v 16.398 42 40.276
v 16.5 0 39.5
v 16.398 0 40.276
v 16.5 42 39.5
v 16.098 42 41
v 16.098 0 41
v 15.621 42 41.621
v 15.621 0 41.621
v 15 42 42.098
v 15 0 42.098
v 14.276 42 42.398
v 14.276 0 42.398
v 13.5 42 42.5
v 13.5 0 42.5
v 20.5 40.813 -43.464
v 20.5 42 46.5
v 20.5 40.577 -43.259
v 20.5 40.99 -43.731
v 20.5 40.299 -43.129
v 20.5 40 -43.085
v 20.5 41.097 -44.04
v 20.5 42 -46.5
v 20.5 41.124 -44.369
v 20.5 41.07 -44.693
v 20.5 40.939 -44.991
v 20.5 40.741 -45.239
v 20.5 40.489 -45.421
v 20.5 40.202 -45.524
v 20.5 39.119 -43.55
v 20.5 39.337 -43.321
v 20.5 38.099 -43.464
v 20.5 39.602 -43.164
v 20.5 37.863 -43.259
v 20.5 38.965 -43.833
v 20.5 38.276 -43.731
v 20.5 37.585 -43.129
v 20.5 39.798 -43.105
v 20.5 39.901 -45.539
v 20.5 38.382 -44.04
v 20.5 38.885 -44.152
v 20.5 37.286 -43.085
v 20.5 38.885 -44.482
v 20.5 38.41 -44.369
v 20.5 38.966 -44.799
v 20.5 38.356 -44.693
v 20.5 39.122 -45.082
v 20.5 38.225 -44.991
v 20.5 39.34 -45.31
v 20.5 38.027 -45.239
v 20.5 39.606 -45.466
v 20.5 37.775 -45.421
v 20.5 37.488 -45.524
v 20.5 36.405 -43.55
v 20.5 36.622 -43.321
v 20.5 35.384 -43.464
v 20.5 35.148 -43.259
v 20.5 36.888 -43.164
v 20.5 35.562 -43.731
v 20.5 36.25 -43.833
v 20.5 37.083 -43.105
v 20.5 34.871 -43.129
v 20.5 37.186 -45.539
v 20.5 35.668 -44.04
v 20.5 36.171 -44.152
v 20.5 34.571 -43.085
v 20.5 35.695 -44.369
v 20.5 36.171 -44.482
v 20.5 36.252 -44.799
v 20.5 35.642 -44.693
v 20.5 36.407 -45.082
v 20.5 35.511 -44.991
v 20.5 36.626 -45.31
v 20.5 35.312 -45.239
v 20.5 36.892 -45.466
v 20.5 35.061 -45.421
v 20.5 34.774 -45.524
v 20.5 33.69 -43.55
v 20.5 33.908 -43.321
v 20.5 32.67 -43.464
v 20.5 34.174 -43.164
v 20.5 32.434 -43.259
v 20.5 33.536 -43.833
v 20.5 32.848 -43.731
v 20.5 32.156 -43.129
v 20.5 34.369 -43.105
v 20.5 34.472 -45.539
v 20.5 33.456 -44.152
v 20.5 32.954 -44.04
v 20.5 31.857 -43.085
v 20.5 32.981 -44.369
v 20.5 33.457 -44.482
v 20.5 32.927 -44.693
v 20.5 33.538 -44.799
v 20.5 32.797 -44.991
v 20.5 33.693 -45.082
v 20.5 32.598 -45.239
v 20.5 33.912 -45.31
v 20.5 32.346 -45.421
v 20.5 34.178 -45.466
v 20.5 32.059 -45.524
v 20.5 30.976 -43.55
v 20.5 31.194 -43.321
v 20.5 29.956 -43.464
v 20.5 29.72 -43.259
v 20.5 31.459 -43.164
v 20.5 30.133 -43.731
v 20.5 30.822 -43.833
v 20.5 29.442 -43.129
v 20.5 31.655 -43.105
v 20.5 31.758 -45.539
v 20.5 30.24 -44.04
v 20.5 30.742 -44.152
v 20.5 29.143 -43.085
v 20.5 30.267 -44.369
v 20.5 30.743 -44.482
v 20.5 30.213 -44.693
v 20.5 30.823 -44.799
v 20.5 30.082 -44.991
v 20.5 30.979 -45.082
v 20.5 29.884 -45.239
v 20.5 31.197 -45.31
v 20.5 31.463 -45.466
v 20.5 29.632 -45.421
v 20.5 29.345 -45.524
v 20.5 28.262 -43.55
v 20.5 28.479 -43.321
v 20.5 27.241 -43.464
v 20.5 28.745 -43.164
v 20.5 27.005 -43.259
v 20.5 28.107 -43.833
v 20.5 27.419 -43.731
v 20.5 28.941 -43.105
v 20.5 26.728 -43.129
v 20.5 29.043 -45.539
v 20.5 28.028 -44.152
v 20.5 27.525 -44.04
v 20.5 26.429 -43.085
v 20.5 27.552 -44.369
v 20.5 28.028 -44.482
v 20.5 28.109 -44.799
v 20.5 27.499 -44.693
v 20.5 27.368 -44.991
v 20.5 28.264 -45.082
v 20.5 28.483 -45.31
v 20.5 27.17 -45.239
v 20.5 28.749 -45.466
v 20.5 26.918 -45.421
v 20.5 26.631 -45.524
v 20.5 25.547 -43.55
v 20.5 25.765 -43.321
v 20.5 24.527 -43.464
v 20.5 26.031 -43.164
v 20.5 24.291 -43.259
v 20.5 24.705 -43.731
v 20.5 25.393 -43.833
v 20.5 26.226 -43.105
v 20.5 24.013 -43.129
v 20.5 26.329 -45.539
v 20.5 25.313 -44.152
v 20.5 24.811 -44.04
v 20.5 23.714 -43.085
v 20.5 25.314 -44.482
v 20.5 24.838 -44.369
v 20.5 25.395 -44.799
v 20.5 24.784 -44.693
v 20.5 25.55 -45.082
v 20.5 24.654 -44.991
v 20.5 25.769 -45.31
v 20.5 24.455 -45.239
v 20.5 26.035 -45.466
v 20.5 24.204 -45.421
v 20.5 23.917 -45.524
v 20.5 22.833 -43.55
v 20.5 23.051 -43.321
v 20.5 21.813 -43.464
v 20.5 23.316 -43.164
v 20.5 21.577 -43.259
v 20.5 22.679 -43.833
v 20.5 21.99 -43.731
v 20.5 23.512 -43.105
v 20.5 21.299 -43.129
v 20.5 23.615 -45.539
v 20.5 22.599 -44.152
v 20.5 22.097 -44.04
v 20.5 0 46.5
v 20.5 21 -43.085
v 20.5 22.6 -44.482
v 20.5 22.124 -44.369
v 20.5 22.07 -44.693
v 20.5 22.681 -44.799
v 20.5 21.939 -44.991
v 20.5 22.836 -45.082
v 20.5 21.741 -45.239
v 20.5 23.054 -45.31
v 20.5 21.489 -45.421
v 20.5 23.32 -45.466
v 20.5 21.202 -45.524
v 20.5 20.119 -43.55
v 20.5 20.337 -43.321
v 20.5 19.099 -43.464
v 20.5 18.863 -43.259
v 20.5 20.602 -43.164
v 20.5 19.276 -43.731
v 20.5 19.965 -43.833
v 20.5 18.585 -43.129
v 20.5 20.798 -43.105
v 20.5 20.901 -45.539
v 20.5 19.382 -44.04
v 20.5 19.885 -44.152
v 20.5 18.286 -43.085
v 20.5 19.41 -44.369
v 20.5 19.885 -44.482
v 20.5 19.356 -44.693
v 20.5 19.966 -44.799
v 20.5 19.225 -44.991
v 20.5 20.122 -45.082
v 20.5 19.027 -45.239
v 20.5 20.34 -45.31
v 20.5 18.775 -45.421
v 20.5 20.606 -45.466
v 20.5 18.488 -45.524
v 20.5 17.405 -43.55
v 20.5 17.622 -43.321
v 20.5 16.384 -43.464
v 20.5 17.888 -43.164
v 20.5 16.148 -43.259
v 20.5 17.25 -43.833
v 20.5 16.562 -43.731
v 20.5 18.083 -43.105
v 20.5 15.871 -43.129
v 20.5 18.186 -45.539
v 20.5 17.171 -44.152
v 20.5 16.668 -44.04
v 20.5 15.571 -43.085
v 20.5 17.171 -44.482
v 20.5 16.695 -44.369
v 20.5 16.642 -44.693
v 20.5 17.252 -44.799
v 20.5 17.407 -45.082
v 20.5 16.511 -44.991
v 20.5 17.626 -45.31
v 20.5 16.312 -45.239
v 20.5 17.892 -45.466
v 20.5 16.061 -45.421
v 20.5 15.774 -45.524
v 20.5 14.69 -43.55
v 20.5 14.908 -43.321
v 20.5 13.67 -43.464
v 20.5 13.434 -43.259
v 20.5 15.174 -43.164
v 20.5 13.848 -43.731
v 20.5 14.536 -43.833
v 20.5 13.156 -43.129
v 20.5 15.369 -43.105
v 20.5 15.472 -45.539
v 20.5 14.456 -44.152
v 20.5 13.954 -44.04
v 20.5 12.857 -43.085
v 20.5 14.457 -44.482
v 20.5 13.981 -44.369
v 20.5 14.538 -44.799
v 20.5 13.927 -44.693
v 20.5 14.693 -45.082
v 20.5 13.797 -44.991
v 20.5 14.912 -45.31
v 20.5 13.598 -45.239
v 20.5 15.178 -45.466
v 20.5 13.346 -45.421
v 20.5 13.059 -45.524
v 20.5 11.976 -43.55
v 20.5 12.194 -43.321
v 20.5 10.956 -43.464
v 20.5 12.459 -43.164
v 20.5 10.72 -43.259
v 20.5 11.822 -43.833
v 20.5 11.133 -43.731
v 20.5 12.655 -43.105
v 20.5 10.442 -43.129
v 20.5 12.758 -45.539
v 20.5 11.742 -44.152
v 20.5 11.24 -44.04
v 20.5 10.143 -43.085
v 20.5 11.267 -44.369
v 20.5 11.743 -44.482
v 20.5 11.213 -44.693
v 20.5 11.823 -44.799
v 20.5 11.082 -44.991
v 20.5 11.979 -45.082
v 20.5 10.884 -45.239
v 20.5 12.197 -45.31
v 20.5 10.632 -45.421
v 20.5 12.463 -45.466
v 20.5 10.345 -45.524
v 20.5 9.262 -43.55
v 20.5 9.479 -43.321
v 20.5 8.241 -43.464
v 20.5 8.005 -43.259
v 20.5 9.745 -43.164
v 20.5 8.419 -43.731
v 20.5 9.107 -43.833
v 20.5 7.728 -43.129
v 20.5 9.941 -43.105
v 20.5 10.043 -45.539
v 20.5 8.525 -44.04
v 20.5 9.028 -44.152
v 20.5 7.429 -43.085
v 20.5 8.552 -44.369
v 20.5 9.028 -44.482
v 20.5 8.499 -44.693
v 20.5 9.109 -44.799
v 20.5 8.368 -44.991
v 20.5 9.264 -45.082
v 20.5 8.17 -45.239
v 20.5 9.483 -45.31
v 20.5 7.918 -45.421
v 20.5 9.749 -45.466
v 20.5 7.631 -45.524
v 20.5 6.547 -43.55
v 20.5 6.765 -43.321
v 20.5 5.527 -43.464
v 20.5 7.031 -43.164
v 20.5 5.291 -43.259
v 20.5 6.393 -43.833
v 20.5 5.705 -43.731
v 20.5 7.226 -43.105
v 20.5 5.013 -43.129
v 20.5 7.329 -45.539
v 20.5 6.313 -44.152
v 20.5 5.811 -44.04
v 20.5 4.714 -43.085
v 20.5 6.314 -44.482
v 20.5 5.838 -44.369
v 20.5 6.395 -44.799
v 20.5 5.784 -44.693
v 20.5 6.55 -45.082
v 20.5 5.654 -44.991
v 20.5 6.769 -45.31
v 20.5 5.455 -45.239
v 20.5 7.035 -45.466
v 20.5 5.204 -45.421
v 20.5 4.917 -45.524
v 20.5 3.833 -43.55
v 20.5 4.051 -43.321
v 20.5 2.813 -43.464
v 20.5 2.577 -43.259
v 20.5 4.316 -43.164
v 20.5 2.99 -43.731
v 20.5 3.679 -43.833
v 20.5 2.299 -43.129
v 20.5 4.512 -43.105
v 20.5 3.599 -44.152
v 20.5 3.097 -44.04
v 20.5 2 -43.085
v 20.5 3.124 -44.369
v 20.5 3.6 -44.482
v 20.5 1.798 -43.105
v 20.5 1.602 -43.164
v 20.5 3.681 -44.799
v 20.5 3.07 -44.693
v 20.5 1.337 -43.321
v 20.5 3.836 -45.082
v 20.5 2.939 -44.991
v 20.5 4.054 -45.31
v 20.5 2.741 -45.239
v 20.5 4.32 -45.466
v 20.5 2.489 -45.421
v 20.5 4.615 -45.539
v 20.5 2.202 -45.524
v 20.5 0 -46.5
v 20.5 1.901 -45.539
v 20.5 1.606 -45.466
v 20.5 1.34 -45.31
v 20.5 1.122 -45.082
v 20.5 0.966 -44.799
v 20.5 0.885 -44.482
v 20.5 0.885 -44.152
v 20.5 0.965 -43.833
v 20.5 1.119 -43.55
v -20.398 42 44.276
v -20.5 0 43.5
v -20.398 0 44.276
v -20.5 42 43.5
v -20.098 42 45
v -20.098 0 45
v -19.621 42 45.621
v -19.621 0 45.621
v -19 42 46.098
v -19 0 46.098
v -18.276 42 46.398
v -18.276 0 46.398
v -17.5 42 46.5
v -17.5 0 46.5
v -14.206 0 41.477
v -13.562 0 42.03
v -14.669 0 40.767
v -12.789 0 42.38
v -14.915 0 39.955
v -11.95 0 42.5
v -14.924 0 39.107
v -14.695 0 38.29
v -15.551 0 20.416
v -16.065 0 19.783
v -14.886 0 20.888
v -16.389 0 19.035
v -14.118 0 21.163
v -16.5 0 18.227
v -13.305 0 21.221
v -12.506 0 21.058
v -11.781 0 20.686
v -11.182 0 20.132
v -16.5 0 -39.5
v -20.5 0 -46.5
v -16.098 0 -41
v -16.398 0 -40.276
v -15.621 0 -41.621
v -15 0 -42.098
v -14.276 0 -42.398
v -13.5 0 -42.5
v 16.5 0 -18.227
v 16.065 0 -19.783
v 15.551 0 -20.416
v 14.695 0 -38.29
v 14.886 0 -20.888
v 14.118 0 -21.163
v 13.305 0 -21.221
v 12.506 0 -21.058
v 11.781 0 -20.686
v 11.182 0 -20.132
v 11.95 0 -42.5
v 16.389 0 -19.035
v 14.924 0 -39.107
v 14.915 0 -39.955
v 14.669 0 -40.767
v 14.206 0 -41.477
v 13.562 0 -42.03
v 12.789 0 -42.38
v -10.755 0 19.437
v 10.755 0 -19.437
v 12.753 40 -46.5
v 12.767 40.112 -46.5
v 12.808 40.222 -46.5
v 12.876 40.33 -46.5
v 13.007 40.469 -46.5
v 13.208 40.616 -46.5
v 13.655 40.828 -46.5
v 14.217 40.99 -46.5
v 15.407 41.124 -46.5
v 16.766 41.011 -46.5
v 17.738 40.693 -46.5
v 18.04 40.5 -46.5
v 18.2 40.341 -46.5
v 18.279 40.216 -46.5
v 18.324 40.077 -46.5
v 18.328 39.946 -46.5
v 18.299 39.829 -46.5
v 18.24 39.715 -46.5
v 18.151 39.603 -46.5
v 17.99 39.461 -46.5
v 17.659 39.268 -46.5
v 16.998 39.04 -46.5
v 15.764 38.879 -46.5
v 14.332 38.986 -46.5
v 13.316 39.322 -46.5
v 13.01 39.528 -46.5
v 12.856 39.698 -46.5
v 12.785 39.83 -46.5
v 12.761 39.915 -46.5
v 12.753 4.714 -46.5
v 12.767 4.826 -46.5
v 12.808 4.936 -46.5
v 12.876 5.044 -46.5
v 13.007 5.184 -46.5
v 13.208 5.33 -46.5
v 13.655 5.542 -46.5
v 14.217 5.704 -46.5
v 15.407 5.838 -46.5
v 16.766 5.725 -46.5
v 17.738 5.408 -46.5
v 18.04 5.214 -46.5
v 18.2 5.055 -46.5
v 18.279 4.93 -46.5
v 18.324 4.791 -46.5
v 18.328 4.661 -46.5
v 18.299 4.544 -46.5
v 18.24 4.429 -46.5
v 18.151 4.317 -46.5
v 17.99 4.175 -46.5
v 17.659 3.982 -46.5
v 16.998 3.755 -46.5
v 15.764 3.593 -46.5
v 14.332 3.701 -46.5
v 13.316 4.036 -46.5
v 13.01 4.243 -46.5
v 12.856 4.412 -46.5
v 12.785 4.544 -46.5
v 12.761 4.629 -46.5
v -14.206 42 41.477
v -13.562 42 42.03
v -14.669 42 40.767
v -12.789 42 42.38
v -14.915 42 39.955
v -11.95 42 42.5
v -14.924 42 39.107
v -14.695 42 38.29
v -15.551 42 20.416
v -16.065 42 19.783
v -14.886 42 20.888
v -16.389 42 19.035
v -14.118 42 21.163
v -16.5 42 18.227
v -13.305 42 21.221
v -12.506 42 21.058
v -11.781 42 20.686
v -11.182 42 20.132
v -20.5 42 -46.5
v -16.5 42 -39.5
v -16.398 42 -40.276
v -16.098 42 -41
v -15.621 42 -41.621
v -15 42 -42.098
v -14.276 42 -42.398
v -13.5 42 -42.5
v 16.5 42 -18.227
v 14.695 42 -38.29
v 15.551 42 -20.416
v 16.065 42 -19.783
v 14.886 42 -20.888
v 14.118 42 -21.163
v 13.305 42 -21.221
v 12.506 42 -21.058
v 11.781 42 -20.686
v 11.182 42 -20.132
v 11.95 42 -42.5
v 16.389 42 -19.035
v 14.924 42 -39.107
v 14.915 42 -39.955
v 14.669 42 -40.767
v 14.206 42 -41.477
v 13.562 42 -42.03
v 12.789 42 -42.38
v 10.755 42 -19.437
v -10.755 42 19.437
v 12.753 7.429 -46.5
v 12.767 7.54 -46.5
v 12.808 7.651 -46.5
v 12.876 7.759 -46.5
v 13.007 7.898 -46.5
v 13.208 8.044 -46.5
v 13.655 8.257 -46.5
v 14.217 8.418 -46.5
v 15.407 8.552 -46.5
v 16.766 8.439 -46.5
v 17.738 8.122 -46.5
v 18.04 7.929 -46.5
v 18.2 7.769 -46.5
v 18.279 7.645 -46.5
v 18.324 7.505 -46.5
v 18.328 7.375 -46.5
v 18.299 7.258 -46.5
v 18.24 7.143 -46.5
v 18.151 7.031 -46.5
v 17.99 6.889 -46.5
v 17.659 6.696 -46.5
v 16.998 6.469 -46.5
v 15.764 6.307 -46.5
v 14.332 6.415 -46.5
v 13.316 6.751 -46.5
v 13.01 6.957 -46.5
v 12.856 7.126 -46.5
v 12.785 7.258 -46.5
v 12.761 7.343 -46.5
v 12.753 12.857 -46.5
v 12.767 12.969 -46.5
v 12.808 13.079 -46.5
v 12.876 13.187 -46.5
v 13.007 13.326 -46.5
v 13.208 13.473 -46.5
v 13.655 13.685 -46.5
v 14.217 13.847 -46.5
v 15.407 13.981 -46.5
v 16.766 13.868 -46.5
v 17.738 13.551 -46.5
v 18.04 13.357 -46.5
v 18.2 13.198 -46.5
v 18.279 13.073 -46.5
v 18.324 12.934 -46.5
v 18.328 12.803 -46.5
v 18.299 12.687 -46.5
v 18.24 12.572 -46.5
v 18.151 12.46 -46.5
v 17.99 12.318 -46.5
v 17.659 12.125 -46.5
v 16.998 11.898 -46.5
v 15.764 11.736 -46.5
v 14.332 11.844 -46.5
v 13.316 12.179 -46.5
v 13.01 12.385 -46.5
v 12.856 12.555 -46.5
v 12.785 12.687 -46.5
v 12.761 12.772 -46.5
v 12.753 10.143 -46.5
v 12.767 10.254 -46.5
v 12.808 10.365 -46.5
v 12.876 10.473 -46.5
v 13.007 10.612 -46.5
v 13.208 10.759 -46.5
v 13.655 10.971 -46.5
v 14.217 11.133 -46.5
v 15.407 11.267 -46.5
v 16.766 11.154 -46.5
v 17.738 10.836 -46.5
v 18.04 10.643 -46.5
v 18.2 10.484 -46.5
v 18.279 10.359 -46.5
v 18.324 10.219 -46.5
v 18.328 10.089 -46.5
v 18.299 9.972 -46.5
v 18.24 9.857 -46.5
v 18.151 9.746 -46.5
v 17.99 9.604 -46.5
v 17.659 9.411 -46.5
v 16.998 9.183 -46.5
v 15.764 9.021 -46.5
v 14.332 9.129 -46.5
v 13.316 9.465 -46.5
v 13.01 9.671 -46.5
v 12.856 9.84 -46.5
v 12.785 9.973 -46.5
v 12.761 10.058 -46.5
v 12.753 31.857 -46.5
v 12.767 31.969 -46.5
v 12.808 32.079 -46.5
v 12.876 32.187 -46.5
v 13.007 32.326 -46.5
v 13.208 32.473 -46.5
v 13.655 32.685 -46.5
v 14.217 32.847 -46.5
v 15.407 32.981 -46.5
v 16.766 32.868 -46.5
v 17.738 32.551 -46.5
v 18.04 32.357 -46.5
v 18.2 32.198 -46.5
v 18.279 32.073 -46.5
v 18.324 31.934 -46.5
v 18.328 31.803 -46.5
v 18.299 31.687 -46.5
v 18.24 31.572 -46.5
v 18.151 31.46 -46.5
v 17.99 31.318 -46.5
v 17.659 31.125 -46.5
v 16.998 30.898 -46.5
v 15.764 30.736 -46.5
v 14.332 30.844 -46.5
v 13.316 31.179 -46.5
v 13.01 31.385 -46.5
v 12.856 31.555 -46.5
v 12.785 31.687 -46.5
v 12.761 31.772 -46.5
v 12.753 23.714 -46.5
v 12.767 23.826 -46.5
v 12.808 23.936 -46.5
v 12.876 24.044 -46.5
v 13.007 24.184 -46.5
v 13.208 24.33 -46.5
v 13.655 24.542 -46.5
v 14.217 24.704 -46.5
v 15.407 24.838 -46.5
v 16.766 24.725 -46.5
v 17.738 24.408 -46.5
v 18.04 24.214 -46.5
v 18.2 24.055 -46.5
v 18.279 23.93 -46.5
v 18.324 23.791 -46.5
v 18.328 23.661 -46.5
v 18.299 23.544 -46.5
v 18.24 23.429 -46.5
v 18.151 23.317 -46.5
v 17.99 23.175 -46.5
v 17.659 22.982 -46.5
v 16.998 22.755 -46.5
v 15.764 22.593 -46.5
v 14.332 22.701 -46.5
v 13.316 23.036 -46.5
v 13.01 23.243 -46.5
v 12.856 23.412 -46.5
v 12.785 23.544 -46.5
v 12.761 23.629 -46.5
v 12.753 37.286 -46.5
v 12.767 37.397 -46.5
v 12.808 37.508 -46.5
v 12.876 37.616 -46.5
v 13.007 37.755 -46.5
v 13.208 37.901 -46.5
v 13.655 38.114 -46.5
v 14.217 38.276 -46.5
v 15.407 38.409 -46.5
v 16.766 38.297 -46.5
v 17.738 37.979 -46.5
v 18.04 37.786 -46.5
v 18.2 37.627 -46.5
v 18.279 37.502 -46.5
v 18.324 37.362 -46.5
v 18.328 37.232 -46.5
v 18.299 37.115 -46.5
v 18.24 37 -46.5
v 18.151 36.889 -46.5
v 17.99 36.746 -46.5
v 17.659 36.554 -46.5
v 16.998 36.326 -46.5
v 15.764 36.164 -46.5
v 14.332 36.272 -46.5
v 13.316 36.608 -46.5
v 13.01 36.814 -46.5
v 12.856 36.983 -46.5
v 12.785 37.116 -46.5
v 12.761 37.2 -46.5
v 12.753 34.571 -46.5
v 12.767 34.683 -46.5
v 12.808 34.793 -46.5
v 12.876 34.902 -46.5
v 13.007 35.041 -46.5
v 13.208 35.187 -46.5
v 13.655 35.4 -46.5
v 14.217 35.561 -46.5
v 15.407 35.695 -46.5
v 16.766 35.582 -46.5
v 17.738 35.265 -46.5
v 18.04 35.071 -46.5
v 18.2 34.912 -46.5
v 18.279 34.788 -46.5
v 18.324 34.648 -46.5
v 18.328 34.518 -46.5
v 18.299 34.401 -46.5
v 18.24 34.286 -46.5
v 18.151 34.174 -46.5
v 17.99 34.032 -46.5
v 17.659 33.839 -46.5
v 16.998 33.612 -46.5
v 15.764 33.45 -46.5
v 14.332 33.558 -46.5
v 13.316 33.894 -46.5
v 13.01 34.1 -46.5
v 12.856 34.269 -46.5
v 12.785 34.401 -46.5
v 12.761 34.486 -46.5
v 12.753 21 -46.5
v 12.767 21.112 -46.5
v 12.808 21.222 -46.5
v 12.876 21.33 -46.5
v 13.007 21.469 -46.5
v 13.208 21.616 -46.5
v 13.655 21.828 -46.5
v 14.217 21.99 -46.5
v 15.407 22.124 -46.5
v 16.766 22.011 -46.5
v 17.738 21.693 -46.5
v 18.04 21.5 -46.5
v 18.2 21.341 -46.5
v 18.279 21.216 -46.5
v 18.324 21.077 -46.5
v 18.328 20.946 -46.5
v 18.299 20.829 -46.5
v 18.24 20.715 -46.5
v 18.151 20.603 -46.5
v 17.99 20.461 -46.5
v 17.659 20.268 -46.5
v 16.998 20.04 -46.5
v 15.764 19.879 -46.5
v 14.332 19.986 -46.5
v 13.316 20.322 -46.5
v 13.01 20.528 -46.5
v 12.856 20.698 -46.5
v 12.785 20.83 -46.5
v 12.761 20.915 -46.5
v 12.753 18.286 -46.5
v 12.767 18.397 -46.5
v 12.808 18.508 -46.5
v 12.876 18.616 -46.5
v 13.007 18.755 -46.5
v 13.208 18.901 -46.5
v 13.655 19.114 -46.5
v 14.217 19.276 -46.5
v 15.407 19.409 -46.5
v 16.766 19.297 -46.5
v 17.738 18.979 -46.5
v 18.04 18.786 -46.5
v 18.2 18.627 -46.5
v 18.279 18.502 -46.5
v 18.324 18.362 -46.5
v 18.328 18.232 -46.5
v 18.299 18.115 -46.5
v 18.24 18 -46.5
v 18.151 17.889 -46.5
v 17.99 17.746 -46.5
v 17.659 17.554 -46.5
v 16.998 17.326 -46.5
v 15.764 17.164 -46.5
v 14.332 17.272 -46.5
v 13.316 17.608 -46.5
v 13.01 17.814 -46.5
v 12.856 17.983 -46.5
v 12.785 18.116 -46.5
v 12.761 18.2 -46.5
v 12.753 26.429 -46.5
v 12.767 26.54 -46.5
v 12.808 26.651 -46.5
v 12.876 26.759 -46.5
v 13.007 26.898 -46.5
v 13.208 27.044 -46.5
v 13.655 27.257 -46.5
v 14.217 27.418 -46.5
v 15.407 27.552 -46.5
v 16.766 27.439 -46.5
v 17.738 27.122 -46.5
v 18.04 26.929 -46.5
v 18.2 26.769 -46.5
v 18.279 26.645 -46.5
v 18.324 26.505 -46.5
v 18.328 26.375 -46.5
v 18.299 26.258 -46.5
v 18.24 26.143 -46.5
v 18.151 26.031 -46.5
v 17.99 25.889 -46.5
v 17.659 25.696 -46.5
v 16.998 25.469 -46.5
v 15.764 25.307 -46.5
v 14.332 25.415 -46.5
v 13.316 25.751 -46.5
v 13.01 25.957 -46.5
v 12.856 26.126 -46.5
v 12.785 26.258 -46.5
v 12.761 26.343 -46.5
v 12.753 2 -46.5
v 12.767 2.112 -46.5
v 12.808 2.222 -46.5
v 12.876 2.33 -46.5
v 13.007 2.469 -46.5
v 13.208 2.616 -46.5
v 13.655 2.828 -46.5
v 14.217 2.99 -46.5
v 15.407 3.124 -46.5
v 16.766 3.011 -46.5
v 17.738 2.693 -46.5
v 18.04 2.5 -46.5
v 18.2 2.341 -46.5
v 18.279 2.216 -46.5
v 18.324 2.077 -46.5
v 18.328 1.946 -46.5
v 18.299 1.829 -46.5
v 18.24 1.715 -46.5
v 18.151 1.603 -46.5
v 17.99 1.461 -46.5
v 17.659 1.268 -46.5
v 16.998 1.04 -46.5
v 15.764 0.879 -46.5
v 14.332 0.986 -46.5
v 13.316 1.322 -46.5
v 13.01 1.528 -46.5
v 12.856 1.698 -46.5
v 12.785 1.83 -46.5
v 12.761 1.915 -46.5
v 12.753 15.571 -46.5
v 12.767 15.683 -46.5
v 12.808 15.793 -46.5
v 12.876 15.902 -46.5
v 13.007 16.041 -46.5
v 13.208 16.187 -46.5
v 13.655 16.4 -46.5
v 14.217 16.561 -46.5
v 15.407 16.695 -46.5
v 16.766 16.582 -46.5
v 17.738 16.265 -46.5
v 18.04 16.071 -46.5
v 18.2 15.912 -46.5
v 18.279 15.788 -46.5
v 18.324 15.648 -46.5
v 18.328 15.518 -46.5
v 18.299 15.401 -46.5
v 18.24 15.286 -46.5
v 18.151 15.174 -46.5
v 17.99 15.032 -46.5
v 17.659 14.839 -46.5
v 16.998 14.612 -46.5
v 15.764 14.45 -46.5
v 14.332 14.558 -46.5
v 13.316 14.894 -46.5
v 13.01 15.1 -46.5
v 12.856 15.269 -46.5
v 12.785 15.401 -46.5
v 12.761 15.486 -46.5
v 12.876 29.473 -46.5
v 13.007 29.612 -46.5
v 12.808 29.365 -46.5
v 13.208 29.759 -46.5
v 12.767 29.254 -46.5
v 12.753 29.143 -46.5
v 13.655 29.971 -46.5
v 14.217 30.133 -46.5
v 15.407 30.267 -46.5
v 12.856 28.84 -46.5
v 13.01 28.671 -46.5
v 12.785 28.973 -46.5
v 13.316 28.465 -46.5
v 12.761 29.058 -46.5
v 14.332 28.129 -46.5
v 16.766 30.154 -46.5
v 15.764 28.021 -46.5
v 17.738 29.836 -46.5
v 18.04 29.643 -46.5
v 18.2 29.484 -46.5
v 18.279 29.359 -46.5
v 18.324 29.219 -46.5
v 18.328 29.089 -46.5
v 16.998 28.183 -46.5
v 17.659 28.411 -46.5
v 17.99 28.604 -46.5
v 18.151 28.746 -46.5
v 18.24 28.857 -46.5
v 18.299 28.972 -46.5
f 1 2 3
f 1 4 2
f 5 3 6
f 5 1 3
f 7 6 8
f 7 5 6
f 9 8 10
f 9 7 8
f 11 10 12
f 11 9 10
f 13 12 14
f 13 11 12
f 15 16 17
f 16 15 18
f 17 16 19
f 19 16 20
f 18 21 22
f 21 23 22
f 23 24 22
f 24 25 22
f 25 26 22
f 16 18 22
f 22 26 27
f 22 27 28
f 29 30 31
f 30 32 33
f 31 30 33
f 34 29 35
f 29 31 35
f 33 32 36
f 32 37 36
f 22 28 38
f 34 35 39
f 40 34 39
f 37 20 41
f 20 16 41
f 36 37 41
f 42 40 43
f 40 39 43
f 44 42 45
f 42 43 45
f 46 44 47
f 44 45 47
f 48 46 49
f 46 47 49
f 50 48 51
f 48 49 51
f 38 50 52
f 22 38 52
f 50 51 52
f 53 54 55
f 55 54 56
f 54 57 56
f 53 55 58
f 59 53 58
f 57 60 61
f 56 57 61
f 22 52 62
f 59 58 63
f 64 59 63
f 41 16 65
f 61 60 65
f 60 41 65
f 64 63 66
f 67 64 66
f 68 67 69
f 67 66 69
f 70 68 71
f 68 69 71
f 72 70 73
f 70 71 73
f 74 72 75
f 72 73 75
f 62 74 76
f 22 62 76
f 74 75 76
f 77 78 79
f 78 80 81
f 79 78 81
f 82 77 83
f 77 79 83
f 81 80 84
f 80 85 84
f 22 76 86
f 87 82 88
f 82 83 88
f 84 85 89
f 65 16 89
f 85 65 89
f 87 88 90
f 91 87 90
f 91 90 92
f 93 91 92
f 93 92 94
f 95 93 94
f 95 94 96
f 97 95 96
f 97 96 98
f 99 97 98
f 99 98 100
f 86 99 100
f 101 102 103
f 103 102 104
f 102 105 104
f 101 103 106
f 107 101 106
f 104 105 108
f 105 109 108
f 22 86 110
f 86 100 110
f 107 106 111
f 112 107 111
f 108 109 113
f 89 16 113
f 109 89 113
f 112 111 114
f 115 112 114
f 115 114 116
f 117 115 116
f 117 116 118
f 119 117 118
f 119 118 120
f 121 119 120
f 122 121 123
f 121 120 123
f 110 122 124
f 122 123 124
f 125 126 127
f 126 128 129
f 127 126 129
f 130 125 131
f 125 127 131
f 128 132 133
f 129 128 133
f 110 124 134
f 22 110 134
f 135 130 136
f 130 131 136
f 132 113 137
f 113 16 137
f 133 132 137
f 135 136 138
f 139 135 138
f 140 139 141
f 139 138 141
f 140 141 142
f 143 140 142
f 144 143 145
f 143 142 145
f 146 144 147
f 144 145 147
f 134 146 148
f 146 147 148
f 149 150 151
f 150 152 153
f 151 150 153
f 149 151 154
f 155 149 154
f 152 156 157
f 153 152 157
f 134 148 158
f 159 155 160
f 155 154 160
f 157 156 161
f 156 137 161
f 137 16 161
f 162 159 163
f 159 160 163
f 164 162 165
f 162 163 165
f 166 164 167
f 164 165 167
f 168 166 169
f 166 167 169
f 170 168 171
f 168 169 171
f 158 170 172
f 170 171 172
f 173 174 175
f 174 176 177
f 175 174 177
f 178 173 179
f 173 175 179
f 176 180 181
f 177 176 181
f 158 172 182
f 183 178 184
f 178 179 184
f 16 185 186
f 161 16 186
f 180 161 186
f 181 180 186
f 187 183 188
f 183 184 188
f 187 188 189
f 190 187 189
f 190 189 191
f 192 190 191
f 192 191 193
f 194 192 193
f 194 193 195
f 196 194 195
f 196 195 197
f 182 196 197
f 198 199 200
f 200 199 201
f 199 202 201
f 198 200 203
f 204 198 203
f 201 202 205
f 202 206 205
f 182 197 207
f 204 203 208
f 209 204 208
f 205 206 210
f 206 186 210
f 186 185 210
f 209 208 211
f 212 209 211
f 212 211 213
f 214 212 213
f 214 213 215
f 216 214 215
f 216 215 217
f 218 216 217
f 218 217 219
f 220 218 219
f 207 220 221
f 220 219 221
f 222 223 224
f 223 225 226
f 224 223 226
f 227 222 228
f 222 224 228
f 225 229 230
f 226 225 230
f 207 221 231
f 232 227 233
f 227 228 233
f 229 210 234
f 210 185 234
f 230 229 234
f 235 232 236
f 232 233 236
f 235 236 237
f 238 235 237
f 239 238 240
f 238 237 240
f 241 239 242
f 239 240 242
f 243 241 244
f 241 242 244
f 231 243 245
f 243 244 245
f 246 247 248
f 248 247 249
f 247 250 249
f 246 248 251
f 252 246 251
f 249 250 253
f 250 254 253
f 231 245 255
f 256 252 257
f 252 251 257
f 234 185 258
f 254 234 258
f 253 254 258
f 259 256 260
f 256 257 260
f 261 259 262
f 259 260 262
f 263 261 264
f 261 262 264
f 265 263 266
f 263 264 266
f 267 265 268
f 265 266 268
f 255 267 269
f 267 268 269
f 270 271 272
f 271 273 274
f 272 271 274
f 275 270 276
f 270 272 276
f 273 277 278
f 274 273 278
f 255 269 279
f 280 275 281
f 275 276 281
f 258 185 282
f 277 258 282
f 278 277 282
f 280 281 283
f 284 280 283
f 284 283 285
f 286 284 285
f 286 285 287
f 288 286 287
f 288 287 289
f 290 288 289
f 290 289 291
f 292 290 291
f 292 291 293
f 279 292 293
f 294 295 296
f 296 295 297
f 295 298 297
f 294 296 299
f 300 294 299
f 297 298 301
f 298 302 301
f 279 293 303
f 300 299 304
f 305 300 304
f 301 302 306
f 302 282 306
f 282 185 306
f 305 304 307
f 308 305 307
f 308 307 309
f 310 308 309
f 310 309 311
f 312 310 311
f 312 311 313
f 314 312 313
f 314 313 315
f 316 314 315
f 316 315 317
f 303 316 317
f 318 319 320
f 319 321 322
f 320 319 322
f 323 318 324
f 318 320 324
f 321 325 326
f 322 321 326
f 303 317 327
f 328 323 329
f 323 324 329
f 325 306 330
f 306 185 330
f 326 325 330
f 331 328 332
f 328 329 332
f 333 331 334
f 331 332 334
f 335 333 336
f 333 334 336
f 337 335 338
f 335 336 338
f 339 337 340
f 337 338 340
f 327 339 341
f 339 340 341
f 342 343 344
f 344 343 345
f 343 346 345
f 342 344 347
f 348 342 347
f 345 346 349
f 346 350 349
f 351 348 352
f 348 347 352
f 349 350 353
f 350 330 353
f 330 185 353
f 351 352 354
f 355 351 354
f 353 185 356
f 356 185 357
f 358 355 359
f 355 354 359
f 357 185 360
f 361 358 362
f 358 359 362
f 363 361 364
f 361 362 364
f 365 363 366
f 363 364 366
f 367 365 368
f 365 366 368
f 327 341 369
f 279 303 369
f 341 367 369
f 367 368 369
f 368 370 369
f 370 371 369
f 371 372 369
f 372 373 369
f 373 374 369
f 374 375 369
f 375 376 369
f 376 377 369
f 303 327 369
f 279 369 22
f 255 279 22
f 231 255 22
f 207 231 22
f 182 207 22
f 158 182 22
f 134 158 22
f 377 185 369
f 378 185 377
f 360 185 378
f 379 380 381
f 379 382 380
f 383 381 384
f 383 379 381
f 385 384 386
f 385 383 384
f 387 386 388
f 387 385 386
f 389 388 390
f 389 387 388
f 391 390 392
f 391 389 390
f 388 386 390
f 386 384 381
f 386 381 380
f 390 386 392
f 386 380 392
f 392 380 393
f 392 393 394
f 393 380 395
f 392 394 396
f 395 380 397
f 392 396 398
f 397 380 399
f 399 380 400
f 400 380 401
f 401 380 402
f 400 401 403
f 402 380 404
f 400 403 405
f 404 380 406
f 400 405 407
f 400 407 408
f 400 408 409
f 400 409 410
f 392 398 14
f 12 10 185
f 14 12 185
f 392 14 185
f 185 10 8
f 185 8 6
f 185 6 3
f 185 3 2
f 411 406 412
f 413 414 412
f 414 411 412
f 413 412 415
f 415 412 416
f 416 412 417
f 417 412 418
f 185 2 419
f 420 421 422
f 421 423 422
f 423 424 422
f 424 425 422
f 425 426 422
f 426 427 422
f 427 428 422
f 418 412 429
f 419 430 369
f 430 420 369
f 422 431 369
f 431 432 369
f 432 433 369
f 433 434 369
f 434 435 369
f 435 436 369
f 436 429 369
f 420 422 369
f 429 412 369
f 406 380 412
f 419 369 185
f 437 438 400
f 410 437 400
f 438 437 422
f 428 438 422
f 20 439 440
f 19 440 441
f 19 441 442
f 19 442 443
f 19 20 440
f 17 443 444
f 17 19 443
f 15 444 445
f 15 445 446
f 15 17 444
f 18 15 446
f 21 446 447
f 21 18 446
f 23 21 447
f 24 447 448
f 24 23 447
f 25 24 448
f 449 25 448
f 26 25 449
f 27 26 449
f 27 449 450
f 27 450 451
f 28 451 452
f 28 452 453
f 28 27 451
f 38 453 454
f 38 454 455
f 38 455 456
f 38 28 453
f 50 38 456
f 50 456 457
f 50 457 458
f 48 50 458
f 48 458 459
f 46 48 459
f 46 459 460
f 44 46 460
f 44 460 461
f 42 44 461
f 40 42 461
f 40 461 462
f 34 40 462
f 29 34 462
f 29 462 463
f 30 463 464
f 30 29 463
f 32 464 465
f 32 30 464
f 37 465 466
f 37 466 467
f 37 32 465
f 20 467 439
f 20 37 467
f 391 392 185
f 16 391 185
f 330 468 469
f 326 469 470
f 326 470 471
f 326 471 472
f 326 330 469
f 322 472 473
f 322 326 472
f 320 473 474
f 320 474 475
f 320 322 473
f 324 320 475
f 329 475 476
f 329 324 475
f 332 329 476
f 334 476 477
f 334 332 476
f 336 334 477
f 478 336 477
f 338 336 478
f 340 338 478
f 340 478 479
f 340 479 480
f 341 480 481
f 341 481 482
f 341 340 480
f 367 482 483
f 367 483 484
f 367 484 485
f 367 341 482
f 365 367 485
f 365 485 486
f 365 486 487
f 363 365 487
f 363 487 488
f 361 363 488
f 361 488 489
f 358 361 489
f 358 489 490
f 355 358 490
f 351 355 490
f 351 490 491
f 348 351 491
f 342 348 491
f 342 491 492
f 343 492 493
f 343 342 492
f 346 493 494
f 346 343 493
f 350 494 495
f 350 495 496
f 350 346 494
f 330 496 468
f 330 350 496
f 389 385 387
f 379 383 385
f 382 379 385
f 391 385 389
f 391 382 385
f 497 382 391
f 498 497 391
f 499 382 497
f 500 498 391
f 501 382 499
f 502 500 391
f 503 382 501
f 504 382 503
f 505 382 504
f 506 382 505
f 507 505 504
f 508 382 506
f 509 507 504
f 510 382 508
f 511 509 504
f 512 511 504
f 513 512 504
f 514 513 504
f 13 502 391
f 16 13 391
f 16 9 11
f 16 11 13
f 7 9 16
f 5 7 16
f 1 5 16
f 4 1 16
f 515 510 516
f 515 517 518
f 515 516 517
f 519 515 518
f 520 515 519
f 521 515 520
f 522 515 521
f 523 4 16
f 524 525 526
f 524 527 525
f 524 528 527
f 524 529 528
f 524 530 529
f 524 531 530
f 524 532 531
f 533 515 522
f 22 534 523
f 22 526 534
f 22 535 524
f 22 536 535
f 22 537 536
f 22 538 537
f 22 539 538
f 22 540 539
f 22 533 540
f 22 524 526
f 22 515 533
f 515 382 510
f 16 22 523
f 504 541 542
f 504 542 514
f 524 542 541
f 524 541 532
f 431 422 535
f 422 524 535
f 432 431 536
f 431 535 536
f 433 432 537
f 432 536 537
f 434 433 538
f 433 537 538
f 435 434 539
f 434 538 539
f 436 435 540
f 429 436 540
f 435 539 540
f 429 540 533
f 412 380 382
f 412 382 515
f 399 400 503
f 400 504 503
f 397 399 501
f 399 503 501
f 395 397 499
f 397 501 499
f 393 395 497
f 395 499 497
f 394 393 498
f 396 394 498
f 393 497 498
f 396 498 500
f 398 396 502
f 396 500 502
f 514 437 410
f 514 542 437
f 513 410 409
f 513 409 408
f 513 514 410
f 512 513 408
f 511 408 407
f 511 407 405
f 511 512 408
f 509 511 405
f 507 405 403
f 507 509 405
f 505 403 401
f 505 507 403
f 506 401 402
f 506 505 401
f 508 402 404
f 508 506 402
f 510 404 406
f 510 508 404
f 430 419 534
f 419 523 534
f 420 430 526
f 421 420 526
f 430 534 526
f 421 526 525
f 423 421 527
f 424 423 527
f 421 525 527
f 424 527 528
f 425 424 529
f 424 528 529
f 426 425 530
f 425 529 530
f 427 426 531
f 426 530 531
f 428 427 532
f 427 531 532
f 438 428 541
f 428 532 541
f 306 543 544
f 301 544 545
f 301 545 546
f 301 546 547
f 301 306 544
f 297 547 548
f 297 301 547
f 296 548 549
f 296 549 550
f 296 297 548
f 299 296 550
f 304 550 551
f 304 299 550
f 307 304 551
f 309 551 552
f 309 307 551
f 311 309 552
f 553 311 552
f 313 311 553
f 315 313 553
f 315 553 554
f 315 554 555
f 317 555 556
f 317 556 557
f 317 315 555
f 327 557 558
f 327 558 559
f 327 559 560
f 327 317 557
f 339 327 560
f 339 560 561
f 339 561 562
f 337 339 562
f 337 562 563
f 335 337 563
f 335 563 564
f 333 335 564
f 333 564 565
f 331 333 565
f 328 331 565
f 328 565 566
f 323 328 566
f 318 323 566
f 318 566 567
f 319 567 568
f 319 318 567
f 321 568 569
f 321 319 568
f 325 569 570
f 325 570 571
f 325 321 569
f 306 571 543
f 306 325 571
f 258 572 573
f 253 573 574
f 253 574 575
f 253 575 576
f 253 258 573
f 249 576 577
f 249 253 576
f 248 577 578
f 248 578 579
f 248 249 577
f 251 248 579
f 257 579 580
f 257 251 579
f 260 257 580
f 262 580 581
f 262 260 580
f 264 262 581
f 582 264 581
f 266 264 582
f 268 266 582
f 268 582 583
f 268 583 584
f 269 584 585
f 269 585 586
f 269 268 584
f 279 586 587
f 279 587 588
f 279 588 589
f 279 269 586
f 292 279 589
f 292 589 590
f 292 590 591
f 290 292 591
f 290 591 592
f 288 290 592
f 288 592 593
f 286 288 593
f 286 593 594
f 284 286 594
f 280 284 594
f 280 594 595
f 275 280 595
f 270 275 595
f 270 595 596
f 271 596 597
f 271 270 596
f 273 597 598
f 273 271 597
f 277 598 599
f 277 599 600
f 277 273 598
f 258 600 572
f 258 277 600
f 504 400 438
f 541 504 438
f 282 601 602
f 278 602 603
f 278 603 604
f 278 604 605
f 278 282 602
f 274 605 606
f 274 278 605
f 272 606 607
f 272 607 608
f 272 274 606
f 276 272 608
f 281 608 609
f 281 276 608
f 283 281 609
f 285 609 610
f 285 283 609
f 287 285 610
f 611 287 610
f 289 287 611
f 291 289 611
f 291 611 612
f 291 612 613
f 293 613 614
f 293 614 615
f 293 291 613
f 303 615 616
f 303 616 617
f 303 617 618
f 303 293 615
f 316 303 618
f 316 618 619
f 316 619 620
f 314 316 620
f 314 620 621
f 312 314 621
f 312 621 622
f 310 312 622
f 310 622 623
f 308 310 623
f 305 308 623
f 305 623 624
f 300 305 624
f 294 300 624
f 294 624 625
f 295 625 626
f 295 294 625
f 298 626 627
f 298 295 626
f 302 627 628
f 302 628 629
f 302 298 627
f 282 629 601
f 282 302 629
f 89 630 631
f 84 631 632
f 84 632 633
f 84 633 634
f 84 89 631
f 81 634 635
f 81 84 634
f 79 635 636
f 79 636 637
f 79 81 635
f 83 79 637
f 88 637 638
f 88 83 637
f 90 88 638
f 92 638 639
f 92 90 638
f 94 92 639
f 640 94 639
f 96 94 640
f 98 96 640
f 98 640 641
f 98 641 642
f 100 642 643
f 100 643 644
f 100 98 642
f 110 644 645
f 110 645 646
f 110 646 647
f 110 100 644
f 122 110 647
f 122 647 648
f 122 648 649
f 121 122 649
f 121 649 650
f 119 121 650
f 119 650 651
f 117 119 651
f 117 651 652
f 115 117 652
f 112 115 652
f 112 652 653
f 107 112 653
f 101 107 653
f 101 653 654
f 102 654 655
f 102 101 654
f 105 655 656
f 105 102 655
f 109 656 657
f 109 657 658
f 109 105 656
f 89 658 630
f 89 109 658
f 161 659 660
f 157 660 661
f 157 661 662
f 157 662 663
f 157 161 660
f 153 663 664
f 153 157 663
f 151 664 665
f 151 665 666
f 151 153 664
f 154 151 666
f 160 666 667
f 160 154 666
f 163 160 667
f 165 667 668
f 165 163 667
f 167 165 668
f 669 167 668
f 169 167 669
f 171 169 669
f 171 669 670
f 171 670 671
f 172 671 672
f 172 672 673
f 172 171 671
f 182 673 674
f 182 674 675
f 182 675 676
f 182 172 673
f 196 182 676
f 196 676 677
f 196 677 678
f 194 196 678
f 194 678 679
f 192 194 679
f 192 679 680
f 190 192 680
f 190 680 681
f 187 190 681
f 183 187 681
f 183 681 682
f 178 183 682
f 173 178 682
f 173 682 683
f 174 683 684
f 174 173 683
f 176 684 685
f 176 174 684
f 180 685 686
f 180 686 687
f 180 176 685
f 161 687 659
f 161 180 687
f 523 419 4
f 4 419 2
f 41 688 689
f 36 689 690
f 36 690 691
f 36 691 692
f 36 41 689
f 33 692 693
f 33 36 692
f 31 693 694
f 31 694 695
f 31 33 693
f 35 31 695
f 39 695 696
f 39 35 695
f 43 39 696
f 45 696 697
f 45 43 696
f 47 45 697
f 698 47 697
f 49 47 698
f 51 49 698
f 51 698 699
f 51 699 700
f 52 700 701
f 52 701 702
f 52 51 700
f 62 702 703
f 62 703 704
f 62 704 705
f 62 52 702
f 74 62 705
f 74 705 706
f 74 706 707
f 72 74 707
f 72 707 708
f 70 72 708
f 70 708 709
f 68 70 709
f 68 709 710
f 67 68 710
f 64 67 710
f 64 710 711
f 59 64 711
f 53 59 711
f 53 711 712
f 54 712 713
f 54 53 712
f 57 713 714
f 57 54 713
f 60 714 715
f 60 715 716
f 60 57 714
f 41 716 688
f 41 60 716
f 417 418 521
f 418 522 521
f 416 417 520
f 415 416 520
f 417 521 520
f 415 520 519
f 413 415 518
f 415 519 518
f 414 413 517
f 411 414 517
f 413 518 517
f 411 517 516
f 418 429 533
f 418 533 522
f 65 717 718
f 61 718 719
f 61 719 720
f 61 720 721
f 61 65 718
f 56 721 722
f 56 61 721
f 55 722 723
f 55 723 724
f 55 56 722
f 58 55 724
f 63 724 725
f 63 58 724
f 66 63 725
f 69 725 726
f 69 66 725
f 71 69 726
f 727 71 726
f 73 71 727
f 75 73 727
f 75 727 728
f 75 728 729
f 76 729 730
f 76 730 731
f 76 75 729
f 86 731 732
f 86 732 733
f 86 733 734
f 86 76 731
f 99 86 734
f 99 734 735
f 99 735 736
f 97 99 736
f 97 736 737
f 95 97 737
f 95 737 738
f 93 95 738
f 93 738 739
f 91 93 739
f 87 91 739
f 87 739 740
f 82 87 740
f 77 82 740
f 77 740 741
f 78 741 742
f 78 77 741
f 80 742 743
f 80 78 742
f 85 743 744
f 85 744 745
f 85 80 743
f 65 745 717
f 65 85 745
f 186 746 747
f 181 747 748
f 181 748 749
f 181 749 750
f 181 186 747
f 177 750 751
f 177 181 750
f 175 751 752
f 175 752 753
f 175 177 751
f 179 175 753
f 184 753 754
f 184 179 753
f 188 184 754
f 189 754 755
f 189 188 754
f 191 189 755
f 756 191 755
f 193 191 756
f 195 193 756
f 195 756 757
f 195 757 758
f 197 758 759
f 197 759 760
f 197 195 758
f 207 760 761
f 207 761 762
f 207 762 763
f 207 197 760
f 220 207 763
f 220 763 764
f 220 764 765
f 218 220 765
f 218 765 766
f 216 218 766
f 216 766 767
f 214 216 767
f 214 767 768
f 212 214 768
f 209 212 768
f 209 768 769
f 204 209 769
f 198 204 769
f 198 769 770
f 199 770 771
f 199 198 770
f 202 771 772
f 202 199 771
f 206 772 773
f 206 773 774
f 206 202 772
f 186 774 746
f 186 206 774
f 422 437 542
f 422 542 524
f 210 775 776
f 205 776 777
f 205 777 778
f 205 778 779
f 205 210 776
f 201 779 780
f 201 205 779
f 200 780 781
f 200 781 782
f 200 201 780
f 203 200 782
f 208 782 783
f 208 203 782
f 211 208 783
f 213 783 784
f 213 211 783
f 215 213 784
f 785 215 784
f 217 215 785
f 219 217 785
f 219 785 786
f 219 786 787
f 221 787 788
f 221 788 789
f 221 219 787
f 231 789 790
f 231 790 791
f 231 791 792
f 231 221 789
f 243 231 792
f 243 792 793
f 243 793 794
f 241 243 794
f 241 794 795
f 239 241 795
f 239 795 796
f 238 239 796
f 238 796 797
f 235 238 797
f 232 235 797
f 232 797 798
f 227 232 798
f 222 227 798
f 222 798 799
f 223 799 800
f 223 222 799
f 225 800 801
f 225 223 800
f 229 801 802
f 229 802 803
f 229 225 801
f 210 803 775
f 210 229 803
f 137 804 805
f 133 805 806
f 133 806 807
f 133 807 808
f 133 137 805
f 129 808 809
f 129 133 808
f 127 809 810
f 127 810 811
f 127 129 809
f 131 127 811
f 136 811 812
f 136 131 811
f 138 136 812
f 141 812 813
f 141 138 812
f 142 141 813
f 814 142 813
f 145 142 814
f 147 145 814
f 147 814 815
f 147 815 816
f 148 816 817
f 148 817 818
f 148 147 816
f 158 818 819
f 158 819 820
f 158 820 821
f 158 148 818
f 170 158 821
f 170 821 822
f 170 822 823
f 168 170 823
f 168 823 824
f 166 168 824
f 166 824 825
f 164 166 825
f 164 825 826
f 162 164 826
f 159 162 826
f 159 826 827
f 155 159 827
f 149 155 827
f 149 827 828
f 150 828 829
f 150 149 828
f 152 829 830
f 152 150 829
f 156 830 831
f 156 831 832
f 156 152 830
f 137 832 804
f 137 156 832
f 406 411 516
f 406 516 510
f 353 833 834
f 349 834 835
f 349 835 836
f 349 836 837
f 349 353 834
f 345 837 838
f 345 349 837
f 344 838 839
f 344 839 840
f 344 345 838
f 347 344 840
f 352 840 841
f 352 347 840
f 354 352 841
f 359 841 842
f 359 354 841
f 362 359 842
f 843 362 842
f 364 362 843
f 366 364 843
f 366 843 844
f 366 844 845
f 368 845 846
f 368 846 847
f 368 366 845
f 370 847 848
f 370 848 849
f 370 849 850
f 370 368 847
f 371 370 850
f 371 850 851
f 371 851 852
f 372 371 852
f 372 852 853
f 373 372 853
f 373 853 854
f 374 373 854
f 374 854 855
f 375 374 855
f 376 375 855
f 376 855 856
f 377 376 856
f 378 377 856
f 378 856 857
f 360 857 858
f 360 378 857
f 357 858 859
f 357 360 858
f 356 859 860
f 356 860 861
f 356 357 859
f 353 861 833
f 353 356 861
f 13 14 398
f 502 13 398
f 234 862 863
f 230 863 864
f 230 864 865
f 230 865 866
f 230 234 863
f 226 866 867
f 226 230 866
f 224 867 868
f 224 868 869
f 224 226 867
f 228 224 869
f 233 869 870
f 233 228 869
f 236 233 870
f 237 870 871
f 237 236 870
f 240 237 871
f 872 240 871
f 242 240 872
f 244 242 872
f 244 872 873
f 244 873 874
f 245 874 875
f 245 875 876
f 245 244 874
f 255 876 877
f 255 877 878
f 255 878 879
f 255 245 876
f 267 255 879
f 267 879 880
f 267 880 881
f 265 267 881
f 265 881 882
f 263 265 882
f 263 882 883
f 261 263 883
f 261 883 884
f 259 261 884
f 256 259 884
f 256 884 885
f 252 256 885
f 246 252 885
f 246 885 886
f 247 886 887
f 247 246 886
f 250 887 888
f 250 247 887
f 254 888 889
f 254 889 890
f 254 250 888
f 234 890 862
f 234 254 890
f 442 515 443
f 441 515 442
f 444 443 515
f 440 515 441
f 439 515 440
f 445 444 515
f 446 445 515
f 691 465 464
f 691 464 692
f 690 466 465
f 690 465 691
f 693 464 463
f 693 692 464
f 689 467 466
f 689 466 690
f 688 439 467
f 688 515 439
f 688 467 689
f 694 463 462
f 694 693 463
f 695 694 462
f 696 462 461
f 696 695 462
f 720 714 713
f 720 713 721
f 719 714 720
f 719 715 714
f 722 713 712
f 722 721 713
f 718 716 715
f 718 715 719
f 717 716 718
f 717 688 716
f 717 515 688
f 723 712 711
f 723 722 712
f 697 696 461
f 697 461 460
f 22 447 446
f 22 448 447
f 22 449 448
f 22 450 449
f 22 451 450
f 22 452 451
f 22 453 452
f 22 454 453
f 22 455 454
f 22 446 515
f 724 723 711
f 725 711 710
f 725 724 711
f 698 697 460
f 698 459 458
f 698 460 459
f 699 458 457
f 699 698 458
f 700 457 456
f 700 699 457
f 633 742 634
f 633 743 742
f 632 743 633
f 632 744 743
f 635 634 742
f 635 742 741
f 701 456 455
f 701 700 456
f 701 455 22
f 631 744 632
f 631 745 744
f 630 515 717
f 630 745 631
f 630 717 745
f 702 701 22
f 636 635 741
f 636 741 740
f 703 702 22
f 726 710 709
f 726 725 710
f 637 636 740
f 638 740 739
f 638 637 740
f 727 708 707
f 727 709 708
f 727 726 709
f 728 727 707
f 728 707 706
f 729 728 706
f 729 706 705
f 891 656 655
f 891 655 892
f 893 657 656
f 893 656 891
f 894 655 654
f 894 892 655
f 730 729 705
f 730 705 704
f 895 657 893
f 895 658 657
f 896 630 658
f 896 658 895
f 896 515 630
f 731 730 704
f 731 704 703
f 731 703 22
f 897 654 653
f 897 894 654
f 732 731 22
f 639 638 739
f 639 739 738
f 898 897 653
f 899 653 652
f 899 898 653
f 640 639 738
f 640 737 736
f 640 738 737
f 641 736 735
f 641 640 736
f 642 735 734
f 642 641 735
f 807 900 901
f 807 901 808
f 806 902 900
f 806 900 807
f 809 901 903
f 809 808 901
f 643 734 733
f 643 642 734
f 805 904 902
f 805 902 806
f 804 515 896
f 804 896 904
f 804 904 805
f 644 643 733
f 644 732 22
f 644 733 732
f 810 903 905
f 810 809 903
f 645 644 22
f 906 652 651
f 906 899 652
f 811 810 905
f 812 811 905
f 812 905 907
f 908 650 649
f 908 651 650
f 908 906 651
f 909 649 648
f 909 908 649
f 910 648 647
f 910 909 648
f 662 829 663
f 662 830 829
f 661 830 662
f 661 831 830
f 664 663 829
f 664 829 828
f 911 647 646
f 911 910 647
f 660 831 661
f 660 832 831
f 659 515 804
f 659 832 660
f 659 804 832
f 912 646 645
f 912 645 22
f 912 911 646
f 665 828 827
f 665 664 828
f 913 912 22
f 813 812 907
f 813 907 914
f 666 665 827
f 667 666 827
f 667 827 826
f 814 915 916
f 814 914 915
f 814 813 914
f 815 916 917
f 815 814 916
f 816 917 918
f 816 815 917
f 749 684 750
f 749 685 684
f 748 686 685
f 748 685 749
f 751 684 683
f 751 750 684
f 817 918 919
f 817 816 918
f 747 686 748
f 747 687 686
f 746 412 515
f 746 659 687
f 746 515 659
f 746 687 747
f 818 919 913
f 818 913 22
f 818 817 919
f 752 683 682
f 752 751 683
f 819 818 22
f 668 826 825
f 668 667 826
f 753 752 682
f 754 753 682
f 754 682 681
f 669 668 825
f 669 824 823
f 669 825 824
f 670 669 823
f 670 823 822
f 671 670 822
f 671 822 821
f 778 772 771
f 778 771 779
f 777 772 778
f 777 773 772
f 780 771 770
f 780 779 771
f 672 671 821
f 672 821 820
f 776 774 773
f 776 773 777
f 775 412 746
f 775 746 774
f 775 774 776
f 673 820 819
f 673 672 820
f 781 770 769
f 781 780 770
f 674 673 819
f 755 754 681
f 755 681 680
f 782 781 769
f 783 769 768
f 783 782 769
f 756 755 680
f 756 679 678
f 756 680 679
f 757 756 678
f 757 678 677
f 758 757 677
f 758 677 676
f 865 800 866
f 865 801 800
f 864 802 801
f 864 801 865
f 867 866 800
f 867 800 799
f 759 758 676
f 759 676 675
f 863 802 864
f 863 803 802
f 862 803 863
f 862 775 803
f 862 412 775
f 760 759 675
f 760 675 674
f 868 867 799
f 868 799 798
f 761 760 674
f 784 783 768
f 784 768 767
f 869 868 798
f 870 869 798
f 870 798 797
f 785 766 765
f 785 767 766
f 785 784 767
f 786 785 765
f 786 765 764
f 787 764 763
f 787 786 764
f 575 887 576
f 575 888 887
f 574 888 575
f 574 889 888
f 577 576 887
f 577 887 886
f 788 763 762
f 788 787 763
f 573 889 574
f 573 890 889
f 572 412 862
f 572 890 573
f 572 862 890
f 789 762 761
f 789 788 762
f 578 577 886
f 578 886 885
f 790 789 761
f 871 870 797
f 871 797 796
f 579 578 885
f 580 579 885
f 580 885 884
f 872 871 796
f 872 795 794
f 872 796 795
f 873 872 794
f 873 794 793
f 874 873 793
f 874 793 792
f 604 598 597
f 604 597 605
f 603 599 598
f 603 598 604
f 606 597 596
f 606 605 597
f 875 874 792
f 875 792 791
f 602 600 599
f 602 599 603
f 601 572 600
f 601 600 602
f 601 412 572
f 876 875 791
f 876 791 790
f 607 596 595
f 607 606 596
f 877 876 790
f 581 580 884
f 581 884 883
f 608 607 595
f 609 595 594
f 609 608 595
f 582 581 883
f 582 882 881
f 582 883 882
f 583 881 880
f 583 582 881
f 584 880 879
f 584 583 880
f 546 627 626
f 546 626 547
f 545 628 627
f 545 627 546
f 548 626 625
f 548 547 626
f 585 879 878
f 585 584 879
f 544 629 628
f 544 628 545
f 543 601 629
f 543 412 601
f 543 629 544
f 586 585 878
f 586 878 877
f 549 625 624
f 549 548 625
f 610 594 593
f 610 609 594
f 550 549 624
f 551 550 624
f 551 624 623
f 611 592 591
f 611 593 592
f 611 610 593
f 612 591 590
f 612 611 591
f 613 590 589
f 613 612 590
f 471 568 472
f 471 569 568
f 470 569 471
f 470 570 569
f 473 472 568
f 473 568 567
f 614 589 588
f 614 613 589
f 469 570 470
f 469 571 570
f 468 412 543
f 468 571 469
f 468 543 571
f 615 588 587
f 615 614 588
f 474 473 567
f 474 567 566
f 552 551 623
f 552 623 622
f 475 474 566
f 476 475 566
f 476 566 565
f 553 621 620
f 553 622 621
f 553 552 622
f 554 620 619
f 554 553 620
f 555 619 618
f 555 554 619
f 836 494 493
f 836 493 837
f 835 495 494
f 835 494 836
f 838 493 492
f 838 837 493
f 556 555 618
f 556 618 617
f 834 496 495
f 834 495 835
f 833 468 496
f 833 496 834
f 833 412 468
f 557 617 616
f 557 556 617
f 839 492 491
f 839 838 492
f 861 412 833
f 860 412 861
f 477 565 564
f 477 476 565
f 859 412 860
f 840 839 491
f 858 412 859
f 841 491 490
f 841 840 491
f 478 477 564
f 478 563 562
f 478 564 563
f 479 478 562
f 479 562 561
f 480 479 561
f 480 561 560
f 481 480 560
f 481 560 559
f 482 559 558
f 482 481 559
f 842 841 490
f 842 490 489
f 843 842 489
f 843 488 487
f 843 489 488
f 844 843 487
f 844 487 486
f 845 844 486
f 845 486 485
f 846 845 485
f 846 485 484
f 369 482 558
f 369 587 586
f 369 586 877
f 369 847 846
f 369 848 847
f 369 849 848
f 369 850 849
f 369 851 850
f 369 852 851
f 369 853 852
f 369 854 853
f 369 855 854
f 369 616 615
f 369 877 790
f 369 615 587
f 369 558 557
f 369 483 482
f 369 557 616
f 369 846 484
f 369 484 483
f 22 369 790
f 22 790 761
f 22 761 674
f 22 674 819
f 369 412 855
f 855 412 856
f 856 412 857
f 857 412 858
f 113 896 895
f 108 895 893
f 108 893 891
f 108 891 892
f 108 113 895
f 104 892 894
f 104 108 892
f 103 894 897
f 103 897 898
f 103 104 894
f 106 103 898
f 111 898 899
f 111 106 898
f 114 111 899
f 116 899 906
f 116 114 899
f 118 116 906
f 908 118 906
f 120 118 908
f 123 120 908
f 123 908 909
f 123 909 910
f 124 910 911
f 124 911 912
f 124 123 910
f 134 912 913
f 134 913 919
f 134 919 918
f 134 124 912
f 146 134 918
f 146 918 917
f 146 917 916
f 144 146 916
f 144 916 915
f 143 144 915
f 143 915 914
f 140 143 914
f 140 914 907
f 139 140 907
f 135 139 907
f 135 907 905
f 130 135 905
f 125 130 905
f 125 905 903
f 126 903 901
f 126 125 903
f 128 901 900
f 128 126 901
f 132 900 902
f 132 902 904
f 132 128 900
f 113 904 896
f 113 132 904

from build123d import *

# Parameters (mm, degrees)
SKETCH1_W               = 41
SKETCH1_H               = 93
BOSS_EXTRUDE1_DEPTH     = 42
CUT_EXTRUDE1_DEPTH      = 66.927991021
CUT_EXTRUDE1_DEPTH_BACK = 66.927991021
SKETCH2_R               = 1.125
CUT_EXTRUDE2_DEPTH      = 66.927991021
FILLET1_R               = 3
FILLET2_R               = 3


with BuildPart() as part:
    # Sketch1 → Boss-Extrude1 (new body)
    with BuildSketch(Plane(origin=(0, 0, 0), x_dir=(1, 0, 0), z_dir=(0, 1, 0))):
        Rectangle(SKETCH1_W, SKETCH1_H)
    extrude(amount=BOSS_EXTRUDE1_DEPTH)

    # Sketch2 → Cut-Extrude1 (cut, two sides: drawn at the far end of the back side and taken through both)
    with BuildSketch(Plane(origin=(0, 0, 0), x_dir=(-0.403397958441935, 0, 0.9150246374414619), z_dir=(-0.9150246374414619, 0, -0.403397958441935)).offset(-CUT_EXTRUDE1_DEPTH_BACK)):
        with Locations((-48.818303789, 40)):
            Circle(SKETCH2_R)
        with Locations((-48.818303789, 37.285714286)):
            Circle(SKETCH2_R)
        with Locations((-48.818303789, 34.571428571)):
            Circle(SKETCH2_R)
        with Locations((-48.818303789, 31.857142857)):
            Circle(SKETCH2_R)
        with Locations((-48.818303789, 29.142857143)):
            Circle(SKETCH2_R)
        with Locations((-48.818303789, 26.428571429)):
            Circle(SKETCH2_R)
        with Locations((-48.818303789, 23.714285714)):
            Circle(SKETCH2_R)
        with Locations((-48.818303789, 21)):
            Circle(SKETCH2_R)
        with Locations((-48.818303789, 18.285714286)):
            Circle(SKETCH2_R)
        with Locations((-48.818303789, 15.571428571)):
            Circle(SKETCH2_R)
        with Locations((-48.818303789, 12.857142857)):
            Circle(SKETCH2_R)
        with Locations((-48.818303789, 10.142857143)):
            Circle(SKETCH2_R)
        with Locations((-48.818303789, 7.428571429)):
            Circle(SKETCH2_R)
        with Locations((-48.818303789, 4.714285714)):
            Circle(SKETCH2_R)
        with Locations((-48.818303789, 2)):
            Circle(SKETCH2_R)
    extrude(amount=CUT_EXTRUDE1_DEPTH + CUT_EXTRUDE1_DEPTH_BACK, mode=Mode.SUBTRACT)

    # Sketch3 → Cut-Extrude2 (cut, through all)
    with BuildSketch(Plane.XZ):
        Polygon((16.5, 42.5), (-16.550825643, 42.5), (16.5, -32.468945972), align=None)
        Polygon((-16.5, 32.468945972), (16.550825643, -42.5), (-16.5, -42.5), align=None)
    extrude(amount=-CUT_EXTRUDE2_DEPTH, mode=Mode.SUBTRACT)

    # Fillet1
    fillet1_edges = [part.edges().sort_by_distance(p)[0] for p in [
        (-16.5, 21, -42.5),
        (-16.5, 21, 32.468945972),
        (16.550825643, 21, -42.5),
        (16.5, 21, 42.5),
        (16.5, 21, -32.468945972),
        (-16.550825643, 21, 42.5),
    ]]
    fillet(fillet1_edges, radius=FILLET1_R)

    # Fillet2
    fillet2_edges = [part.edges().sort_by_distance(p)[0] for p in [
        (-20.5, 21, 46.5),
    ]]
    fillet(fillet2_edges, radius=FILLET2_R)


solid = part.part
